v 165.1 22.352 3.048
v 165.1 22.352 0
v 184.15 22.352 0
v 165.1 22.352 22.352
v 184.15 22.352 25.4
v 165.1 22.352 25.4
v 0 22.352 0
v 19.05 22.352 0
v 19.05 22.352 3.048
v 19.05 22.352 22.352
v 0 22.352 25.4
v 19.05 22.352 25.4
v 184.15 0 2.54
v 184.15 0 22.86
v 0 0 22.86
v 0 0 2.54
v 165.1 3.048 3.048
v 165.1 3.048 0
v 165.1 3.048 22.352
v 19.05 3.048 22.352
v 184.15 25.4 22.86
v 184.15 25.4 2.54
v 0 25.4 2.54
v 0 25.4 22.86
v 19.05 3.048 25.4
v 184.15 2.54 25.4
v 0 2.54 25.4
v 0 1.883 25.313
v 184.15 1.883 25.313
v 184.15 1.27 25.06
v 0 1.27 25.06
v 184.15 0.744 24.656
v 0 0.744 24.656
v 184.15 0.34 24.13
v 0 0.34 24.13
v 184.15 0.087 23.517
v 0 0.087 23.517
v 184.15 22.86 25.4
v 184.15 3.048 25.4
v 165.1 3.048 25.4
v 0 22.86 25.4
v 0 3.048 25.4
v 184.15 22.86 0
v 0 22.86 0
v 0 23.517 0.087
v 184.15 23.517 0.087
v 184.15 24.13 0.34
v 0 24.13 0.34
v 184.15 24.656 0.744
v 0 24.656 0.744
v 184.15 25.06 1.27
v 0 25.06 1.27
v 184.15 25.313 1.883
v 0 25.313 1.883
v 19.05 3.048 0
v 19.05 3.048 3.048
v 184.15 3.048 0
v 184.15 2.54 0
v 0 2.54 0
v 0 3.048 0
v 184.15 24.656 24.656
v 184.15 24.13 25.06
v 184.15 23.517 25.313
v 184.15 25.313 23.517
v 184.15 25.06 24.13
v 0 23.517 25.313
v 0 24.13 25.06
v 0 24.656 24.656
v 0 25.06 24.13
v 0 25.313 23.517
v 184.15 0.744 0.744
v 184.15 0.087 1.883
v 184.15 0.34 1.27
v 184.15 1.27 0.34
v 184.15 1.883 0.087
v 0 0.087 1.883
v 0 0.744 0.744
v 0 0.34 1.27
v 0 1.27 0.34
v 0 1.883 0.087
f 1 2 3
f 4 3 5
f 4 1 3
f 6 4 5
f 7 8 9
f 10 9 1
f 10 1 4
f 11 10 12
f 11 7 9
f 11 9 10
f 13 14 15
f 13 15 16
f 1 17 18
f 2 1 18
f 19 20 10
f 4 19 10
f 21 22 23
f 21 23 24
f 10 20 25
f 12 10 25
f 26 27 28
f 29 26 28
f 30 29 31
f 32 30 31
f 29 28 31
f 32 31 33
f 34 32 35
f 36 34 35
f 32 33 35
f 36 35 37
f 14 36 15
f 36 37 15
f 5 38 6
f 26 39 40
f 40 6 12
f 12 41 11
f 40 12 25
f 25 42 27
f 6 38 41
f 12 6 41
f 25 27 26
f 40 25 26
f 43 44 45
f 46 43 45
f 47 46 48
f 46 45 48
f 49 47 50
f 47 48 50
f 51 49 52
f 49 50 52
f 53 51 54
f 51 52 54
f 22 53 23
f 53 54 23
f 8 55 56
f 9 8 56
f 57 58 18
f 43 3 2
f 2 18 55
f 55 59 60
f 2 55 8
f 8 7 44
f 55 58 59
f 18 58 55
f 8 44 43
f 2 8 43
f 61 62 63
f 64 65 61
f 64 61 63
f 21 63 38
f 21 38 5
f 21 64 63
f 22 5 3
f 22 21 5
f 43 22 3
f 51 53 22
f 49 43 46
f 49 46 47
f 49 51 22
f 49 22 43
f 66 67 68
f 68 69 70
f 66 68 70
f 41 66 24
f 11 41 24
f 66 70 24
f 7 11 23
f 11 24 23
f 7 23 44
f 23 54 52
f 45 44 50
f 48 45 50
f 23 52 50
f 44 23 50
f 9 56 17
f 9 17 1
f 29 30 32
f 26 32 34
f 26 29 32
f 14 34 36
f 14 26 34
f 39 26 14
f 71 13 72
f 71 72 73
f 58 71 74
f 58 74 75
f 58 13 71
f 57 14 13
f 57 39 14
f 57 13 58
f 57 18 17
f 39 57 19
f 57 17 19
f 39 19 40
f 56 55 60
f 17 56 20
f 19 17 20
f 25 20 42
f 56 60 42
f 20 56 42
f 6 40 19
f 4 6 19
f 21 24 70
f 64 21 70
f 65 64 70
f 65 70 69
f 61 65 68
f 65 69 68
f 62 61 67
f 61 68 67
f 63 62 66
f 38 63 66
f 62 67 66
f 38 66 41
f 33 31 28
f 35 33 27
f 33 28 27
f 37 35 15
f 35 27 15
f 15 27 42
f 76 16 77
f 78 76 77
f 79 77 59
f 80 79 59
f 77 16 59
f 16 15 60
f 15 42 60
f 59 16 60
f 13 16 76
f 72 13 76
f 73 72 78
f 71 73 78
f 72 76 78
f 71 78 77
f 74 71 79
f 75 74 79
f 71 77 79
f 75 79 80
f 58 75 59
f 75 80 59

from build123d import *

# Parameters (mm, degrees)
SKETCH1_W           = 19.304
SKETCH1_H           = 19.304
BOSS_EXTRUDE1_DEPTH = 184.15
SKETCH2_W           = 25.4
SKETCH2_H           = 19.304
CUT_EXTRUDE1_DEPTH  = 19.05
SKETCH3_W           = 25.4
SKETCH3_H           = 19.304
CUT_EXTRUDE2_DEPTH  = 19.05


with BuildPart() as part:
    # Sketch1 → Boss-Extrude1 (new body)
    with BuildSketch(Plane(origin=(0, 0, 0), x_dir=(0, 0, -1), z_dir=(1, 0, 0))):
        with BuildLine():
            Line((0, 2.54), (0, 22.86))
            ThreePointArc((0, 22.86), (-0.743948776, 24.656051224), (-2.54, 25.4))
            Line((-2.54, 25.4), (-22.86, 25.4))
            ThreePointArc((-22.86, 25.4), (-24.656051224, 24.656051224), (-25.4, 22.86))
            Line((-25.4, 22.86), (-25.4, 2.54))
            ThreePointArc((-25.4, 2.54), (-24.656051224, 0.743948776), (-22.86, 0))
            Line((-22.86, 0), (-2.54, 0))
            ThreePointArc((-2.54, 0), (-0.743948776, 0.743948776), (0, 2.54))
        make_face()
        with Locations((-12.7, 12.7)):
            Rectangle(SKETCH1_W, SKETCH1_H, mode=Mode.SUBTRACT)
    extrude(amount=BOSS_EXTRUDE1_DEPTH)

    # Sketch2 → Cut-Extrude1 (cut)
    with BuildSketch(Plane(origin=(184.15, 0, 0), x_dir=(0, 0, -1), z_dir=(1, 0, 0))):
        with Locations((-12.7, 12.7)):
            Rectangle(SKETCH2_W, SKETCH2_H)
    extrude(amount=-CUT_EXTRUDE1_DEPTH, mode=Mode.SUBTRACT)

    # Sketch3 → Cut-Extrude2 (cut)
    with BuildSketch(Plane.ZY):
        with Locations((12.7, 12.7)):
            Rectangle(SKETCH3_W, SKETCH3_H)
    extrude(amount=-CUT_EXTRUDE2_DEPTH, mode=Mode.SUBTRACT)


solid = part.part
